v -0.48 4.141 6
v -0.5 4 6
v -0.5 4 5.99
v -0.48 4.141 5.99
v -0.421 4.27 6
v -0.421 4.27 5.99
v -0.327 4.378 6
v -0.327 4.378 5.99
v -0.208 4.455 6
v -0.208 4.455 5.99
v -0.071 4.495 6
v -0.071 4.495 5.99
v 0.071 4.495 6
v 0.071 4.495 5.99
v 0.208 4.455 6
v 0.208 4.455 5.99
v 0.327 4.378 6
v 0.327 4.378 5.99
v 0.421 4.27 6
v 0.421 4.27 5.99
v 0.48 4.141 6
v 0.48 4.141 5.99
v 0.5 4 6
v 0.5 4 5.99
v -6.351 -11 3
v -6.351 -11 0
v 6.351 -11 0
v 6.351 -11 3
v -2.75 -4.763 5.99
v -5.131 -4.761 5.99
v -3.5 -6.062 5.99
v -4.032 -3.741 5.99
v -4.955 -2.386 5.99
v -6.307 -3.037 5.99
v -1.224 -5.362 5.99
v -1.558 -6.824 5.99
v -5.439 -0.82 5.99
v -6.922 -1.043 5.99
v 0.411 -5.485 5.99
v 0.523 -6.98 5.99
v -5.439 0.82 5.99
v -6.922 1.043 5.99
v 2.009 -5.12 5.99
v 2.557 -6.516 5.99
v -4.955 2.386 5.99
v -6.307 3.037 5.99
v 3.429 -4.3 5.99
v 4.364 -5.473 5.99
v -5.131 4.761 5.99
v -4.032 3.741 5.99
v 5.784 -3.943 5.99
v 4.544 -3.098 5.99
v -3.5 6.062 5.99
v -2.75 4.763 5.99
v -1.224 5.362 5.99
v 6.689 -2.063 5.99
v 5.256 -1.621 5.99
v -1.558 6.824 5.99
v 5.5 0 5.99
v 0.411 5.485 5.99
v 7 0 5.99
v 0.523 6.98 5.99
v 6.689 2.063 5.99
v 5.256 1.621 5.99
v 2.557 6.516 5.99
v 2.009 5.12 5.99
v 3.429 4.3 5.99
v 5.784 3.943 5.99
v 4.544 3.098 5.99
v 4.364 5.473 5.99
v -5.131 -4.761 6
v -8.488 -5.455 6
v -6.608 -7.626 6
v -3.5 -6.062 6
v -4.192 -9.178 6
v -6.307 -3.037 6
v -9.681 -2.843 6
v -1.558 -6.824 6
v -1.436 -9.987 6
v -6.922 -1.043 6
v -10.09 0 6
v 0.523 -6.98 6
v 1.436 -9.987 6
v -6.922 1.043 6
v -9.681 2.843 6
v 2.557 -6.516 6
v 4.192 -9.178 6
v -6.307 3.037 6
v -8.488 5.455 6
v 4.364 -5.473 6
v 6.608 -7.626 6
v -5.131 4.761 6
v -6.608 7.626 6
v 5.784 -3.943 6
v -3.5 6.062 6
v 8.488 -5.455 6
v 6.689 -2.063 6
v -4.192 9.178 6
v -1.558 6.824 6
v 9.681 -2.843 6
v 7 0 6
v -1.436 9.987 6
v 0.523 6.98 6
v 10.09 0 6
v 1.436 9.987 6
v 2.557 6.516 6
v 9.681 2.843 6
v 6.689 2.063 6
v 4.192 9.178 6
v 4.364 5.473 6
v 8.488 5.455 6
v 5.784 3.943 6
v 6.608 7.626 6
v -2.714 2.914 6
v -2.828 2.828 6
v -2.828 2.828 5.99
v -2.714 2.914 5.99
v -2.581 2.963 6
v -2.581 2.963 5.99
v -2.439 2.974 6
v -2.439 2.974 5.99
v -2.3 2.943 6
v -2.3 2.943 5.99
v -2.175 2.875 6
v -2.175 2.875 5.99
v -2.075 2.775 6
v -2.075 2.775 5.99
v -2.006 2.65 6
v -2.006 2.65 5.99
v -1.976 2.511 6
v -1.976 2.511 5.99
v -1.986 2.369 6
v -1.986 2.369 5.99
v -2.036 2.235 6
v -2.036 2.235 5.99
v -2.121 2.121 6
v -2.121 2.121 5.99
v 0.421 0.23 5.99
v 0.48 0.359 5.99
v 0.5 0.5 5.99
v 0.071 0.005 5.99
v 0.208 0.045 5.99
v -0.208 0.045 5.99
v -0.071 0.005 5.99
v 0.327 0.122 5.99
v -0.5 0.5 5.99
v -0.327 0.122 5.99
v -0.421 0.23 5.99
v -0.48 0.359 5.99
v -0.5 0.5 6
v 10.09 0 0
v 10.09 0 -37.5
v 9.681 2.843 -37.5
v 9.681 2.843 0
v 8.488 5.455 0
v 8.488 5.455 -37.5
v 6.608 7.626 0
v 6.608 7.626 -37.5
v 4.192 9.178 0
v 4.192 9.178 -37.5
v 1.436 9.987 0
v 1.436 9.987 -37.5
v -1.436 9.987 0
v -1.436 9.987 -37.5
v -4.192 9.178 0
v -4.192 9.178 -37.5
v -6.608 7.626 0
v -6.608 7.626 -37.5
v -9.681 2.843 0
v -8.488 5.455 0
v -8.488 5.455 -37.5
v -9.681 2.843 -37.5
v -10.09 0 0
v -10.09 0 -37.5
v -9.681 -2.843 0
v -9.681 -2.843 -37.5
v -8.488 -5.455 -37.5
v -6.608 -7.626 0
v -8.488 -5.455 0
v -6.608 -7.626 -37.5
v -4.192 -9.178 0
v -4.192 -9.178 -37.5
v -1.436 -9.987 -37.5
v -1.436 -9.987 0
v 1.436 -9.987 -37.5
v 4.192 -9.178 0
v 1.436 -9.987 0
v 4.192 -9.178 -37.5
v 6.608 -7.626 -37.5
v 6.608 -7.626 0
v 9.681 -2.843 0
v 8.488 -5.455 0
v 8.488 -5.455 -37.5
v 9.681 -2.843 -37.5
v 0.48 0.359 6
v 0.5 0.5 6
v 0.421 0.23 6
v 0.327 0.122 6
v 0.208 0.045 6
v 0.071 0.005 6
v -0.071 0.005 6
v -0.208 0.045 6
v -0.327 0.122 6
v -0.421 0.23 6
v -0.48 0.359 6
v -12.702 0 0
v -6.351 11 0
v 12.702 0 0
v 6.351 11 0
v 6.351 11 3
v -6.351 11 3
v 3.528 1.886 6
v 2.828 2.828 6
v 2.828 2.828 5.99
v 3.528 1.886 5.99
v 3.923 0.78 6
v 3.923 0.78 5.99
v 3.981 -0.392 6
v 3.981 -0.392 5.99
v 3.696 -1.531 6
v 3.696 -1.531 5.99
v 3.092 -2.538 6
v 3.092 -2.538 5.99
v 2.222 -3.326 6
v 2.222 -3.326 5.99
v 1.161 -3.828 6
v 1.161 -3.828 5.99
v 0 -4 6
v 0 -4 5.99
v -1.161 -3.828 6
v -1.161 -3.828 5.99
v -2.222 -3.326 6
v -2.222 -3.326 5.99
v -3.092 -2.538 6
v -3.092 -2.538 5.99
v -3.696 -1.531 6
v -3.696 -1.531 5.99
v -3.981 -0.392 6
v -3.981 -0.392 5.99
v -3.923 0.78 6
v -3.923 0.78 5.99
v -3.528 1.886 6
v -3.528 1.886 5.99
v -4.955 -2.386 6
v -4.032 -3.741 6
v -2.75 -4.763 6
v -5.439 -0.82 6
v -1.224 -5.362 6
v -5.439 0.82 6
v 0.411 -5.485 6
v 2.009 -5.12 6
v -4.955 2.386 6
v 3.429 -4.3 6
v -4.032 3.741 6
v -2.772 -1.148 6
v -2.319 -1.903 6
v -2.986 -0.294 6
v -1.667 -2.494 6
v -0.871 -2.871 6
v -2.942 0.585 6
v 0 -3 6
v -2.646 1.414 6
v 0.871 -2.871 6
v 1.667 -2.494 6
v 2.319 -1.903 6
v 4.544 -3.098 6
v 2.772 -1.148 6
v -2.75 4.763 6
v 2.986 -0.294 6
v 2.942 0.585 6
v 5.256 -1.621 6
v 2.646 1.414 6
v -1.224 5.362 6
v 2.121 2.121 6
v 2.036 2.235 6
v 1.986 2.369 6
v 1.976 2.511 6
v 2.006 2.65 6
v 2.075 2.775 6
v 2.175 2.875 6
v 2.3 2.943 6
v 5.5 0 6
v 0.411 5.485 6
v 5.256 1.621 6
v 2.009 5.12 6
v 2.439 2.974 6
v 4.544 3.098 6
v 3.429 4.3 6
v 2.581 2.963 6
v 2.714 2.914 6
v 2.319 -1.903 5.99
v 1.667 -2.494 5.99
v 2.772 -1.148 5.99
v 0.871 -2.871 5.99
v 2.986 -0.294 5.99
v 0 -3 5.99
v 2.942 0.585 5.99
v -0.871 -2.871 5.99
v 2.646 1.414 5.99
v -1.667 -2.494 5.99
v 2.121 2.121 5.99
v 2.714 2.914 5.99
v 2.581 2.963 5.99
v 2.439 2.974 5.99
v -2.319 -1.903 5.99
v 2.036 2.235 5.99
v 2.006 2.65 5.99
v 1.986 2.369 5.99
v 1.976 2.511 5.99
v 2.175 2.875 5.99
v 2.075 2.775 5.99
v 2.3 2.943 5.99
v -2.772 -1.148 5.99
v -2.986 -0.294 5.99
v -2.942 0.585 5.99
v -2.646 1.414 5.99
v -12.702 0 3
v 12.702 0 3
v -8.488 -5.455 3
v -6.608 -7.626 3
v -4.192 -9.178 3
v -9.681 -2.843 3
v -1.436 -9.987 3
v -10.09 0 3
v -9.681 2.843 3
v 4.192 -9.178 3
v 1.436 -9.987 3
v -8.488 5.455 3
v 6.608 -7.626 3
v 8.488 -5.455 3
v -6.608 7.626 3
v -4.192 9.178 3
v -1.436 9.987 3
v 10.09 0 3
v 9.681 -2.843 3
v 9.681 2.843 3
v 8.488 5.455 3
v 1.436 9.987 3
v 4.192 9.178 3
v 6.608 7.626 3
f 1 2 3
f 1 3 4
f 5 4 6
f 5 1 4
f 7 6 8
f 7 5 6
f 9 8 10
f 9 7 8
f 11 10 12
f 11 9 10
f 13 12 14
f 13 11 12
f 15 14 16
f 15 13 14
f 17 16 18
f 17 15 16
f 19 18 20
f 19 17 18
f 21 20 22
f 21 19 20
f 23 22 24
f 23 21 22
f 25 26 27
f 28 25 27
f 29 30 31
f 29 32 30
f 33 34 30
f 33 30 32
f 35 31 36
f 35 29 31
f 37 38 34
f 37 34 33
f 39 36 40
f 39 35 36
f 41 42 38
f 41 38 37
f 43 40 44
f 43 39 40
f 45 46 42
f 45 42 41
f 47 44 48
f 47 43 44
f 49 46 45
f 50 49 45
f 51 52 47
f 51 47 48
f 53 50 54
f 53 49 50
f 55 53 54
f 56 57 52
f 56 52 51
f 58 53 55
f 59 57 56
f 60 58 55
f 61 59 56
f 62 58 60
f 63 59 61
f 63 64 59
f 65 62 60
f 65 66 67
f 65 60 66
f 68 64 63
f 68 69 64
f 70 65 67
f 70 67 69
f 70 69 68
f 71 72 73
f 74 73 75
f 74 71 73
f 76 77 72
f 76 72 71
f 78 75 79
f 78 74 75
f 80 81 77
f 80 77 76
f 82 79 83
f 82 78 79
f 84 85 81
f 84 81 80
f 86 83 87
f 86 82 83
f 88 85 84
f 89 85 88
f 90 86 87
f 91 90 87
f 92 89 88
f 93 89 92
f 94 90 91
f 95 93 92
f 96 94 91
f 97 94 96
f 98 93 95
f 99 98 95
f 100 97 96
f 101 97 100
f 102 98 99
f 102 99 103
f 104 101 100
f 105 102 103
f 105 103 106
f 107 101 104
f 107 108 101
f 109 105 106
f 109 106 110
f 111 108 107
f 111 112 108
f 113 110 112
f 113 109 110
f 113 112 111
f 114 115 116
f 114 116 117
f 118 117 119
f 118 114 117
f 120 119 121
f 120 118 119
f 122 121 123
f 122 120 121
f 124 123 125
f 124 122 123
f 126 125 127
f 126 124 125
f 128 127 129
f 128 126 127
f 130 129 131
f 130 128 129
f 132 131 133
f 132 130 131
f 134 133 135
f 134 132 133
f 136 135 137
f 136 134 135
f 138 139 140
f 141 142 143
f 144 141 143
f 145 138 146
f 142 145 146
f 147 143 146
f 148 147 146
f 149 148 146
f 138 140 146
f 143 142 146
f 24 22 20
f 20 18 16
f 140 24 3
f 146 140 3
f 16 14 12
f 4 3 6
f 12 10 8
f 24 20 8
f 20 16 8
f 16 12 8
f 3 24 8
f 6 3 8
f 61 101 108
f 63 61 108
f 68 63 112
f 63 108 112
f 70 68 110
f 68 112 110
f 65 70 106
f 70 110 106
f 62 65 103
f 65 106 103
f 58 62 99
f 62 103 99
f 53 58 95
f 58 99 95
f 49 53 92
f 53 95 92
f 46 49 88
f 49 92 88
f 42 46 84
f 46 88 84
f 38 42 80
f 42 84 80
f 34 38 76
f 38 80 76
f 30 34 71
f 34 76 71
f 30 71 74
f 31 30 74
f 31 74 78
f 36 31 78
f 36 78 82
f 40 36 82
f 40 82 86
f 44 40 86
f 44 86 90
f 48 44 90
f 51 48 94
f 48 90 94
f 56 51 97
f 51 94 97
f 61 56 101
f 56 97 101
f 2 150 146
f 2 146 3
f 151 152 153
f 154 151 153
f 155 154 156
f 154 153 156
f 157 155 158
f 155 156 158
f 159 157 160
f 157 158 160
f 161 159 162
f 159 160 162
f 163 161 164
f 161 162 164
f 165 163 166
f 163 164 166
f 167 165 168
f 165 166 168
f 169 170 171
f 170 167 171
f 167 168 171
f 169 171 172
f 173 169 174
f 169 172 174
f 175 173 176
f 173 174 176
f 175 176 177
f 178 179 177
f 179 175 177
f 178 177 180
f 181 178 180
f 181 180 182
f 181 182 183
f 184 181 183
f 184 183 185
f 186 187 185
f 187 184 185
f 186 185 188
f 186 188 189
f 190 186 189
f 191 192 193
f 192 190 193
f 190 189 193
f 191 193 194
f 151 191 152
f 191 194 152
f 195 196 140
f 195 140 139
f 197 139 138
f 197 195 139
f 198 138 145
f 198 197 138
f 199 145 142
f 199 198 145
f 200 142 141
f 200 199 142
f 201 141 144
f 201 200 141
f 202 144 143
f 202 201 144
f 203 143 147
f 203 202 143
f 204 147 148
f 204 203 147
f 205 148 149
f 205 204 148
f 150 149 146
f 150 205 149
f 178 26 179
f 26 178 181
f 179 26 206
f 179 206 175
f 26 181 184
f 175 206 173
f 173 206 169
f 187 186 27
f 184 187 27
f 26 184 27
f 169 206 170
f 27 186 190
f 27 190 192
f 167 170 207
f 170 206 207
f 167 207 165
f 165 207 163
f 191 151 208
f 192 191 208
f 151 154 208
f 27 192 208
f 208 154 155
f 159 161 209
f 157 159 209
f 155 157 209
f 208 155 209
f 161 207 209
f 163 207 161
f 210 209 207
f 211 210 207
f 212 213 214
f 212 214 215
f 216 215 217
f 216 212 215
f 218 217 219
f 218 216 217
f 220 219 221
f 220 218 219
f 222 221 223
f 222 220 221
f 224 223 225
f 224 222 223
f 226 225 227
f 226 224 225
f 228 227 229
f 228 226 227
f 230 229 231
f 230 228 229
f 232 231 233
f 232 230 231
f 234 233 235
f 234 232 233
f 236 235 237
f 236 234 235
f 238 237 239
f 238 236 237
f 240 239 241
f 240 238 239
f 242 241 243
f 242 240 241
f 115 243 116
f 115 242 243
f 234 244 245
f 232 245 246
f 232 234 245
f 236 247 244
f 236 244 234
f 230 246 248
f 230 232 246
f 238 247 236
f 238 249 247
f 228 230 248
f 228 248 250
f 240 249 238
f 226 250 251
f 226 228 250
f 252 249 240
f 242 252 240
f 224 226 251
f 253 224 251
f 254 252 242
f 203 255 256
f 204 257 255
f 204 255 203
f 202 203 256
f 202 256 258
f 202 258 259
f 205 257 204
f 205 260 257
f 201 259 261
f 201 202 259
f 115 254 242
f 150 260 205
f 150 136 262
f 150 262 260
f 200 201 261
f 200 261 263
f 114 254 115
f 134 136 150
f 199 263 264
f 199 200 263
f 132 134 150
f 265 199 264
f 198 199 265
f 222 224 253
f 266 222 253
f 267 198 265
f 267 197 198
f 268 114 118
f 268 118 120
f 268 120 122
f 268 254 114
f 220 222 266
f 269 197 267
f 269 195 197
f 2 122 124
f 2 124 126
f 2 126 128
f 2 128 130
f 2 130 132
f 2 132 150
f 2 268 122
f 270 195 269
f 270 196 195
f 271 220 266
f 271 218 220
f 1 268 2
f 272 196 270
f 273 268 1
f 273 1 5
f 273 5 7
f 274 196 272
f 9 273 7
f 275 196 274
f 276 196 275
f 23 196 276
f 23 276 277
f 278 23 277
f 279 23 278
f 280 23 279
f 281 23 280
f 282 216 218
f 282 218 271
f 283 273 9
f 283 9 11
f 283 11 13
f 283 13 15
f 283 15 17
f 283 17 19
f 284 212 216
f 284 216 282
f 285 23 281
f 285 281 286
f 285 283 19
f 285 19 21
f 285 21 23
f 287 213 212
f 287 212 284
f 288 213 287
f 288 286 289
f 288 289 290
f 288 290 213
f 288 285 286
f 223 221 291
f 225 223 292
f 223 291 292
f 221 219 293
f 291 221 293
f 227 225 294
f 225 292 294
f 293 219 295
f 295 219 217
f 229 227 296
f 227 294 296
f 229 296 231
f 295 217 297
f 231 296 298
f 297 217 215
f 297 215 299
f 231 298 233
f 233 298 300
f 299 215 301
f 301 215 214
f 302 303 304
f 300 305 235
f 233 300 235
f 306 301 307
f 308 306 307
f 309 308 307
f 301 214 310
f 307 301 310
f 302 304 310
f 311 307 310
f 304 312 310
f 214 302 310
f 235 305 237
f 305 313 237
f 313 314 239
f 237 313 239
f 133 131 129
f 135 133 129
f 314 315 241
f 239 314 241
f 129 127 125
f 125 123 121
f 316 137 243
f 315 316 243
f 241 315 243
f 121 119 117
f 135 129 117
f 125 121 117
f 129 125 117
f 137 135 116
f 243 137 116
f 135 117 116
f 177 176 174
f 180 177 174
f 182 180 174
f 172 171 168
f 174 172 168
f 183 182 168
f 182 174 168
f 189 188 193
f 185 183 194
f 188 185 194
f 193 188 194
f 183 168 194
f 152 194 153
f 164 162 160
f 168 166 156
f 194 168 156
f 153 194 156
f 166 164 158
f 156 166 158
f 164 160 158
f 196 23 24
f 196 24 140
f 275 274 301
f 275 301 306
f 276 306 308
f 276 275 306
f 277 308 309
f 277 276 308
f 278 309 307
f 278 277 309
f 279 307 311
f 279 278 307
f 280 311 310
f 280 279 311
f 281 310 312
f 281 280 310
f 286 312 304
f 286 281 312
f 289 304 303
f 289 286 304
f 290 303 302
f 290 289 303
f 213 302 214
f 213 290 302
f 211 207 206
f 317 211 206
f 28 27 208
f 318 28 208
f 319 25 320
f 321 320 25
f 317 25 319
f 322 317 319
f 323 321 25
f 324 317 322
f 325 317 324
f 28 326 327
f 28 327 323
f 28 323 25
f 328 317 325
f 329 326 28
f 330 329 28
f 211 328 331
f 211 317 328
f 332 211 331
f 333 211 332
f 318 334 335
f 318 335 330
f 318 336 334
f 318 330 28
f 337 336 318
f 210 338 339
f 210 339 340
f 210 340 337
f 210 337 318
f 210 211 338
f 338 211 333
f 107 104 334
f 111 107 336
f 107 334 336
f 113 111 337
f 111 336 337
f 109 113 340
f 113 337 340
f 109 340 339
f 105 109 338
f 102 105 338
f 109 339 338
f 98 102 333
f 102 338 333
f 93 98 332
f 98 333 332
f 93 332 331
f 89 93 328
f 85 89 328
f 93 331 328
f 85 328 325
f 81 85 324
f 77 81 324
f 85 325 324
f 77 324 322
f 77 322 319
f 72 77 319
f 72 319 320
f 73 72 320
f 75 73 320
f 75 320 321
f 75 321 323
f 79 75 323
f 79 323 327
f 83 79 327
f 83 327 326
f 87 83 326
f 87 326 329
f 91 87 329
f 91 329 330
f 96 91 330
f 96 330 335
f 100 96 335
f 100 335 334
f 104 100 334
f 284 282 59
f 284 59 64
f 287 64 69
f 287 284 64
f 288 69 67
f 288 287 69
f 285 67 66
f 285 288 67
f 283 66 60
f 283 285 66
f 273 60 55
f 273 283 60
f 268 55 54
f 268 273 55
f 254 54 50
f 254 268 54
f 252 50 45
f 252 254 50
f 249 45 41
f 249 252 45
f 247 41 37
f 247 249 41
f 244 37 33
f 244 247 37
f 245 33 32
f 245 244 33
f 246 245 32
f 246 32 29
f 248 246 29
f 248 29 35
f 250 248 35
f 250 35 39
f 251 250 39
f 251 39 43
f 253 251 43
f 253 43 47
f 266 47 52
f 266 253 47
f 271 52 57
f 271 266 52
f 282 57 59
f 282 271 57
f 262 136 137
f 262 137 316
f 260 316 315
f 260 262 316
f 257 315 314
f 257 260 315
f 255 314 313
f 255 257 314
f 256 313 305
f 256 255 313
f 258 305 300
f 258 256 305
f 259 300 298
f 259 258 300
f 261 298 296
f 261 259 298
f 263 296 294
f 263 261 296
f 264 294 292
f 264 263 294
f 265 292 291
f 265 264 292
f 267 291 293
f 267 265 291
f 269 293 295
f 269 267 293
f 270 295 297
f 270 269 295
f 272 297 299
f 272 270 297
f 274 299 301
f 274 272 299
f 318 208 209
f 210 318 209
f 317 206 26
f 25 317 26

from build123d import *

# Parameters (mm, degrees)
EXTRUDE_1_DEPTH      = 3
EXTRUDE_2_DEPTH      = 3
EXTRUDE_2_DEPTH_BACK = 40.5
SKETCH_3_R           = 10.09
SKETCH_5_R           = 7
SKETCH_5_R_2         = 5.5
CUT_EXTRUDE_1_DEPTH  = 0.01


with BuildPart() as part:
    # 草图1 → 凸台-拉伸1 (new body)
    with BuildSketch(Plane.XY):
        Polygon((12.701705922, 0), (6.350852961, 11), (-6.350852961, 11), (-12.701705922, 0), (-6.350852961, -11), (6.350852961, -11), align=None)
    extrude(amount=EXTRUDE_1_DEPTH)

    # 草图3 → 凸台-拉伸2 (add, two sides: drawn at the far end of the back side and taken through both)
    with BuildSketch(Plane.XY.offset(3).offset(-EXTRUDE_2_DEPTH_BACK)):
        Circle(SKETCH_3_R)
    extrude(amount=EXTRUDE_2_DEPTH + EXTRUDE_2_DEPTH_BACK)

    # 草图5 → 切除-拉伸1 (cut)
    # profile 1 of 3: a face of its own
    with BuildSketch(Plane.XY.offset(6)):
        Circle(SKETCH_5_R)
        Circle(SKETCH_5_R_2, mode=Mode.SUBTRACT)
    # profile 2 of 3: a face of its own
    with BuildSketch(Plane.XY.offset(6)):
        with BuildLine():
            ThreePointArc((-2.828427125, 2.828427125), (-2.121320344, 2.828427125), (-2.121320344, 2.121320344))
            ThreePointArc((-2.121320344, 2.121320344), (0, -3), (2.121320344, 2.121320344))
            ThreePointArc((2.121320344, 2.121320344), (2.121320344, 2.828427125), (2.828427125, 2.828427125))
            ThreePointArc((2.828427125, 2.828427125), (0, -4), (-2.828427125, 2.828427125))
        make_face()
    # profile 3 of 3: a face of its own
    with BuildSketch(Plane.XY.offset(6)):
        with BuildLine():
            Line((-0.5, 0.5), (-0.5, 4))
            ThreePointArc((-0.5, 4), (0, 4.5), (0.5, 4))
            Line((0.5, 4), (0.5, 0.5))
            ThreePointArc((0.5, 0.5), (0, 0), (-0.5, 0.5))
        make_face()
    extrude(amount=-CUT_EXTRUDE_1_DEPTH, mode=Mode.SUBTRACT)


solid = part.part
